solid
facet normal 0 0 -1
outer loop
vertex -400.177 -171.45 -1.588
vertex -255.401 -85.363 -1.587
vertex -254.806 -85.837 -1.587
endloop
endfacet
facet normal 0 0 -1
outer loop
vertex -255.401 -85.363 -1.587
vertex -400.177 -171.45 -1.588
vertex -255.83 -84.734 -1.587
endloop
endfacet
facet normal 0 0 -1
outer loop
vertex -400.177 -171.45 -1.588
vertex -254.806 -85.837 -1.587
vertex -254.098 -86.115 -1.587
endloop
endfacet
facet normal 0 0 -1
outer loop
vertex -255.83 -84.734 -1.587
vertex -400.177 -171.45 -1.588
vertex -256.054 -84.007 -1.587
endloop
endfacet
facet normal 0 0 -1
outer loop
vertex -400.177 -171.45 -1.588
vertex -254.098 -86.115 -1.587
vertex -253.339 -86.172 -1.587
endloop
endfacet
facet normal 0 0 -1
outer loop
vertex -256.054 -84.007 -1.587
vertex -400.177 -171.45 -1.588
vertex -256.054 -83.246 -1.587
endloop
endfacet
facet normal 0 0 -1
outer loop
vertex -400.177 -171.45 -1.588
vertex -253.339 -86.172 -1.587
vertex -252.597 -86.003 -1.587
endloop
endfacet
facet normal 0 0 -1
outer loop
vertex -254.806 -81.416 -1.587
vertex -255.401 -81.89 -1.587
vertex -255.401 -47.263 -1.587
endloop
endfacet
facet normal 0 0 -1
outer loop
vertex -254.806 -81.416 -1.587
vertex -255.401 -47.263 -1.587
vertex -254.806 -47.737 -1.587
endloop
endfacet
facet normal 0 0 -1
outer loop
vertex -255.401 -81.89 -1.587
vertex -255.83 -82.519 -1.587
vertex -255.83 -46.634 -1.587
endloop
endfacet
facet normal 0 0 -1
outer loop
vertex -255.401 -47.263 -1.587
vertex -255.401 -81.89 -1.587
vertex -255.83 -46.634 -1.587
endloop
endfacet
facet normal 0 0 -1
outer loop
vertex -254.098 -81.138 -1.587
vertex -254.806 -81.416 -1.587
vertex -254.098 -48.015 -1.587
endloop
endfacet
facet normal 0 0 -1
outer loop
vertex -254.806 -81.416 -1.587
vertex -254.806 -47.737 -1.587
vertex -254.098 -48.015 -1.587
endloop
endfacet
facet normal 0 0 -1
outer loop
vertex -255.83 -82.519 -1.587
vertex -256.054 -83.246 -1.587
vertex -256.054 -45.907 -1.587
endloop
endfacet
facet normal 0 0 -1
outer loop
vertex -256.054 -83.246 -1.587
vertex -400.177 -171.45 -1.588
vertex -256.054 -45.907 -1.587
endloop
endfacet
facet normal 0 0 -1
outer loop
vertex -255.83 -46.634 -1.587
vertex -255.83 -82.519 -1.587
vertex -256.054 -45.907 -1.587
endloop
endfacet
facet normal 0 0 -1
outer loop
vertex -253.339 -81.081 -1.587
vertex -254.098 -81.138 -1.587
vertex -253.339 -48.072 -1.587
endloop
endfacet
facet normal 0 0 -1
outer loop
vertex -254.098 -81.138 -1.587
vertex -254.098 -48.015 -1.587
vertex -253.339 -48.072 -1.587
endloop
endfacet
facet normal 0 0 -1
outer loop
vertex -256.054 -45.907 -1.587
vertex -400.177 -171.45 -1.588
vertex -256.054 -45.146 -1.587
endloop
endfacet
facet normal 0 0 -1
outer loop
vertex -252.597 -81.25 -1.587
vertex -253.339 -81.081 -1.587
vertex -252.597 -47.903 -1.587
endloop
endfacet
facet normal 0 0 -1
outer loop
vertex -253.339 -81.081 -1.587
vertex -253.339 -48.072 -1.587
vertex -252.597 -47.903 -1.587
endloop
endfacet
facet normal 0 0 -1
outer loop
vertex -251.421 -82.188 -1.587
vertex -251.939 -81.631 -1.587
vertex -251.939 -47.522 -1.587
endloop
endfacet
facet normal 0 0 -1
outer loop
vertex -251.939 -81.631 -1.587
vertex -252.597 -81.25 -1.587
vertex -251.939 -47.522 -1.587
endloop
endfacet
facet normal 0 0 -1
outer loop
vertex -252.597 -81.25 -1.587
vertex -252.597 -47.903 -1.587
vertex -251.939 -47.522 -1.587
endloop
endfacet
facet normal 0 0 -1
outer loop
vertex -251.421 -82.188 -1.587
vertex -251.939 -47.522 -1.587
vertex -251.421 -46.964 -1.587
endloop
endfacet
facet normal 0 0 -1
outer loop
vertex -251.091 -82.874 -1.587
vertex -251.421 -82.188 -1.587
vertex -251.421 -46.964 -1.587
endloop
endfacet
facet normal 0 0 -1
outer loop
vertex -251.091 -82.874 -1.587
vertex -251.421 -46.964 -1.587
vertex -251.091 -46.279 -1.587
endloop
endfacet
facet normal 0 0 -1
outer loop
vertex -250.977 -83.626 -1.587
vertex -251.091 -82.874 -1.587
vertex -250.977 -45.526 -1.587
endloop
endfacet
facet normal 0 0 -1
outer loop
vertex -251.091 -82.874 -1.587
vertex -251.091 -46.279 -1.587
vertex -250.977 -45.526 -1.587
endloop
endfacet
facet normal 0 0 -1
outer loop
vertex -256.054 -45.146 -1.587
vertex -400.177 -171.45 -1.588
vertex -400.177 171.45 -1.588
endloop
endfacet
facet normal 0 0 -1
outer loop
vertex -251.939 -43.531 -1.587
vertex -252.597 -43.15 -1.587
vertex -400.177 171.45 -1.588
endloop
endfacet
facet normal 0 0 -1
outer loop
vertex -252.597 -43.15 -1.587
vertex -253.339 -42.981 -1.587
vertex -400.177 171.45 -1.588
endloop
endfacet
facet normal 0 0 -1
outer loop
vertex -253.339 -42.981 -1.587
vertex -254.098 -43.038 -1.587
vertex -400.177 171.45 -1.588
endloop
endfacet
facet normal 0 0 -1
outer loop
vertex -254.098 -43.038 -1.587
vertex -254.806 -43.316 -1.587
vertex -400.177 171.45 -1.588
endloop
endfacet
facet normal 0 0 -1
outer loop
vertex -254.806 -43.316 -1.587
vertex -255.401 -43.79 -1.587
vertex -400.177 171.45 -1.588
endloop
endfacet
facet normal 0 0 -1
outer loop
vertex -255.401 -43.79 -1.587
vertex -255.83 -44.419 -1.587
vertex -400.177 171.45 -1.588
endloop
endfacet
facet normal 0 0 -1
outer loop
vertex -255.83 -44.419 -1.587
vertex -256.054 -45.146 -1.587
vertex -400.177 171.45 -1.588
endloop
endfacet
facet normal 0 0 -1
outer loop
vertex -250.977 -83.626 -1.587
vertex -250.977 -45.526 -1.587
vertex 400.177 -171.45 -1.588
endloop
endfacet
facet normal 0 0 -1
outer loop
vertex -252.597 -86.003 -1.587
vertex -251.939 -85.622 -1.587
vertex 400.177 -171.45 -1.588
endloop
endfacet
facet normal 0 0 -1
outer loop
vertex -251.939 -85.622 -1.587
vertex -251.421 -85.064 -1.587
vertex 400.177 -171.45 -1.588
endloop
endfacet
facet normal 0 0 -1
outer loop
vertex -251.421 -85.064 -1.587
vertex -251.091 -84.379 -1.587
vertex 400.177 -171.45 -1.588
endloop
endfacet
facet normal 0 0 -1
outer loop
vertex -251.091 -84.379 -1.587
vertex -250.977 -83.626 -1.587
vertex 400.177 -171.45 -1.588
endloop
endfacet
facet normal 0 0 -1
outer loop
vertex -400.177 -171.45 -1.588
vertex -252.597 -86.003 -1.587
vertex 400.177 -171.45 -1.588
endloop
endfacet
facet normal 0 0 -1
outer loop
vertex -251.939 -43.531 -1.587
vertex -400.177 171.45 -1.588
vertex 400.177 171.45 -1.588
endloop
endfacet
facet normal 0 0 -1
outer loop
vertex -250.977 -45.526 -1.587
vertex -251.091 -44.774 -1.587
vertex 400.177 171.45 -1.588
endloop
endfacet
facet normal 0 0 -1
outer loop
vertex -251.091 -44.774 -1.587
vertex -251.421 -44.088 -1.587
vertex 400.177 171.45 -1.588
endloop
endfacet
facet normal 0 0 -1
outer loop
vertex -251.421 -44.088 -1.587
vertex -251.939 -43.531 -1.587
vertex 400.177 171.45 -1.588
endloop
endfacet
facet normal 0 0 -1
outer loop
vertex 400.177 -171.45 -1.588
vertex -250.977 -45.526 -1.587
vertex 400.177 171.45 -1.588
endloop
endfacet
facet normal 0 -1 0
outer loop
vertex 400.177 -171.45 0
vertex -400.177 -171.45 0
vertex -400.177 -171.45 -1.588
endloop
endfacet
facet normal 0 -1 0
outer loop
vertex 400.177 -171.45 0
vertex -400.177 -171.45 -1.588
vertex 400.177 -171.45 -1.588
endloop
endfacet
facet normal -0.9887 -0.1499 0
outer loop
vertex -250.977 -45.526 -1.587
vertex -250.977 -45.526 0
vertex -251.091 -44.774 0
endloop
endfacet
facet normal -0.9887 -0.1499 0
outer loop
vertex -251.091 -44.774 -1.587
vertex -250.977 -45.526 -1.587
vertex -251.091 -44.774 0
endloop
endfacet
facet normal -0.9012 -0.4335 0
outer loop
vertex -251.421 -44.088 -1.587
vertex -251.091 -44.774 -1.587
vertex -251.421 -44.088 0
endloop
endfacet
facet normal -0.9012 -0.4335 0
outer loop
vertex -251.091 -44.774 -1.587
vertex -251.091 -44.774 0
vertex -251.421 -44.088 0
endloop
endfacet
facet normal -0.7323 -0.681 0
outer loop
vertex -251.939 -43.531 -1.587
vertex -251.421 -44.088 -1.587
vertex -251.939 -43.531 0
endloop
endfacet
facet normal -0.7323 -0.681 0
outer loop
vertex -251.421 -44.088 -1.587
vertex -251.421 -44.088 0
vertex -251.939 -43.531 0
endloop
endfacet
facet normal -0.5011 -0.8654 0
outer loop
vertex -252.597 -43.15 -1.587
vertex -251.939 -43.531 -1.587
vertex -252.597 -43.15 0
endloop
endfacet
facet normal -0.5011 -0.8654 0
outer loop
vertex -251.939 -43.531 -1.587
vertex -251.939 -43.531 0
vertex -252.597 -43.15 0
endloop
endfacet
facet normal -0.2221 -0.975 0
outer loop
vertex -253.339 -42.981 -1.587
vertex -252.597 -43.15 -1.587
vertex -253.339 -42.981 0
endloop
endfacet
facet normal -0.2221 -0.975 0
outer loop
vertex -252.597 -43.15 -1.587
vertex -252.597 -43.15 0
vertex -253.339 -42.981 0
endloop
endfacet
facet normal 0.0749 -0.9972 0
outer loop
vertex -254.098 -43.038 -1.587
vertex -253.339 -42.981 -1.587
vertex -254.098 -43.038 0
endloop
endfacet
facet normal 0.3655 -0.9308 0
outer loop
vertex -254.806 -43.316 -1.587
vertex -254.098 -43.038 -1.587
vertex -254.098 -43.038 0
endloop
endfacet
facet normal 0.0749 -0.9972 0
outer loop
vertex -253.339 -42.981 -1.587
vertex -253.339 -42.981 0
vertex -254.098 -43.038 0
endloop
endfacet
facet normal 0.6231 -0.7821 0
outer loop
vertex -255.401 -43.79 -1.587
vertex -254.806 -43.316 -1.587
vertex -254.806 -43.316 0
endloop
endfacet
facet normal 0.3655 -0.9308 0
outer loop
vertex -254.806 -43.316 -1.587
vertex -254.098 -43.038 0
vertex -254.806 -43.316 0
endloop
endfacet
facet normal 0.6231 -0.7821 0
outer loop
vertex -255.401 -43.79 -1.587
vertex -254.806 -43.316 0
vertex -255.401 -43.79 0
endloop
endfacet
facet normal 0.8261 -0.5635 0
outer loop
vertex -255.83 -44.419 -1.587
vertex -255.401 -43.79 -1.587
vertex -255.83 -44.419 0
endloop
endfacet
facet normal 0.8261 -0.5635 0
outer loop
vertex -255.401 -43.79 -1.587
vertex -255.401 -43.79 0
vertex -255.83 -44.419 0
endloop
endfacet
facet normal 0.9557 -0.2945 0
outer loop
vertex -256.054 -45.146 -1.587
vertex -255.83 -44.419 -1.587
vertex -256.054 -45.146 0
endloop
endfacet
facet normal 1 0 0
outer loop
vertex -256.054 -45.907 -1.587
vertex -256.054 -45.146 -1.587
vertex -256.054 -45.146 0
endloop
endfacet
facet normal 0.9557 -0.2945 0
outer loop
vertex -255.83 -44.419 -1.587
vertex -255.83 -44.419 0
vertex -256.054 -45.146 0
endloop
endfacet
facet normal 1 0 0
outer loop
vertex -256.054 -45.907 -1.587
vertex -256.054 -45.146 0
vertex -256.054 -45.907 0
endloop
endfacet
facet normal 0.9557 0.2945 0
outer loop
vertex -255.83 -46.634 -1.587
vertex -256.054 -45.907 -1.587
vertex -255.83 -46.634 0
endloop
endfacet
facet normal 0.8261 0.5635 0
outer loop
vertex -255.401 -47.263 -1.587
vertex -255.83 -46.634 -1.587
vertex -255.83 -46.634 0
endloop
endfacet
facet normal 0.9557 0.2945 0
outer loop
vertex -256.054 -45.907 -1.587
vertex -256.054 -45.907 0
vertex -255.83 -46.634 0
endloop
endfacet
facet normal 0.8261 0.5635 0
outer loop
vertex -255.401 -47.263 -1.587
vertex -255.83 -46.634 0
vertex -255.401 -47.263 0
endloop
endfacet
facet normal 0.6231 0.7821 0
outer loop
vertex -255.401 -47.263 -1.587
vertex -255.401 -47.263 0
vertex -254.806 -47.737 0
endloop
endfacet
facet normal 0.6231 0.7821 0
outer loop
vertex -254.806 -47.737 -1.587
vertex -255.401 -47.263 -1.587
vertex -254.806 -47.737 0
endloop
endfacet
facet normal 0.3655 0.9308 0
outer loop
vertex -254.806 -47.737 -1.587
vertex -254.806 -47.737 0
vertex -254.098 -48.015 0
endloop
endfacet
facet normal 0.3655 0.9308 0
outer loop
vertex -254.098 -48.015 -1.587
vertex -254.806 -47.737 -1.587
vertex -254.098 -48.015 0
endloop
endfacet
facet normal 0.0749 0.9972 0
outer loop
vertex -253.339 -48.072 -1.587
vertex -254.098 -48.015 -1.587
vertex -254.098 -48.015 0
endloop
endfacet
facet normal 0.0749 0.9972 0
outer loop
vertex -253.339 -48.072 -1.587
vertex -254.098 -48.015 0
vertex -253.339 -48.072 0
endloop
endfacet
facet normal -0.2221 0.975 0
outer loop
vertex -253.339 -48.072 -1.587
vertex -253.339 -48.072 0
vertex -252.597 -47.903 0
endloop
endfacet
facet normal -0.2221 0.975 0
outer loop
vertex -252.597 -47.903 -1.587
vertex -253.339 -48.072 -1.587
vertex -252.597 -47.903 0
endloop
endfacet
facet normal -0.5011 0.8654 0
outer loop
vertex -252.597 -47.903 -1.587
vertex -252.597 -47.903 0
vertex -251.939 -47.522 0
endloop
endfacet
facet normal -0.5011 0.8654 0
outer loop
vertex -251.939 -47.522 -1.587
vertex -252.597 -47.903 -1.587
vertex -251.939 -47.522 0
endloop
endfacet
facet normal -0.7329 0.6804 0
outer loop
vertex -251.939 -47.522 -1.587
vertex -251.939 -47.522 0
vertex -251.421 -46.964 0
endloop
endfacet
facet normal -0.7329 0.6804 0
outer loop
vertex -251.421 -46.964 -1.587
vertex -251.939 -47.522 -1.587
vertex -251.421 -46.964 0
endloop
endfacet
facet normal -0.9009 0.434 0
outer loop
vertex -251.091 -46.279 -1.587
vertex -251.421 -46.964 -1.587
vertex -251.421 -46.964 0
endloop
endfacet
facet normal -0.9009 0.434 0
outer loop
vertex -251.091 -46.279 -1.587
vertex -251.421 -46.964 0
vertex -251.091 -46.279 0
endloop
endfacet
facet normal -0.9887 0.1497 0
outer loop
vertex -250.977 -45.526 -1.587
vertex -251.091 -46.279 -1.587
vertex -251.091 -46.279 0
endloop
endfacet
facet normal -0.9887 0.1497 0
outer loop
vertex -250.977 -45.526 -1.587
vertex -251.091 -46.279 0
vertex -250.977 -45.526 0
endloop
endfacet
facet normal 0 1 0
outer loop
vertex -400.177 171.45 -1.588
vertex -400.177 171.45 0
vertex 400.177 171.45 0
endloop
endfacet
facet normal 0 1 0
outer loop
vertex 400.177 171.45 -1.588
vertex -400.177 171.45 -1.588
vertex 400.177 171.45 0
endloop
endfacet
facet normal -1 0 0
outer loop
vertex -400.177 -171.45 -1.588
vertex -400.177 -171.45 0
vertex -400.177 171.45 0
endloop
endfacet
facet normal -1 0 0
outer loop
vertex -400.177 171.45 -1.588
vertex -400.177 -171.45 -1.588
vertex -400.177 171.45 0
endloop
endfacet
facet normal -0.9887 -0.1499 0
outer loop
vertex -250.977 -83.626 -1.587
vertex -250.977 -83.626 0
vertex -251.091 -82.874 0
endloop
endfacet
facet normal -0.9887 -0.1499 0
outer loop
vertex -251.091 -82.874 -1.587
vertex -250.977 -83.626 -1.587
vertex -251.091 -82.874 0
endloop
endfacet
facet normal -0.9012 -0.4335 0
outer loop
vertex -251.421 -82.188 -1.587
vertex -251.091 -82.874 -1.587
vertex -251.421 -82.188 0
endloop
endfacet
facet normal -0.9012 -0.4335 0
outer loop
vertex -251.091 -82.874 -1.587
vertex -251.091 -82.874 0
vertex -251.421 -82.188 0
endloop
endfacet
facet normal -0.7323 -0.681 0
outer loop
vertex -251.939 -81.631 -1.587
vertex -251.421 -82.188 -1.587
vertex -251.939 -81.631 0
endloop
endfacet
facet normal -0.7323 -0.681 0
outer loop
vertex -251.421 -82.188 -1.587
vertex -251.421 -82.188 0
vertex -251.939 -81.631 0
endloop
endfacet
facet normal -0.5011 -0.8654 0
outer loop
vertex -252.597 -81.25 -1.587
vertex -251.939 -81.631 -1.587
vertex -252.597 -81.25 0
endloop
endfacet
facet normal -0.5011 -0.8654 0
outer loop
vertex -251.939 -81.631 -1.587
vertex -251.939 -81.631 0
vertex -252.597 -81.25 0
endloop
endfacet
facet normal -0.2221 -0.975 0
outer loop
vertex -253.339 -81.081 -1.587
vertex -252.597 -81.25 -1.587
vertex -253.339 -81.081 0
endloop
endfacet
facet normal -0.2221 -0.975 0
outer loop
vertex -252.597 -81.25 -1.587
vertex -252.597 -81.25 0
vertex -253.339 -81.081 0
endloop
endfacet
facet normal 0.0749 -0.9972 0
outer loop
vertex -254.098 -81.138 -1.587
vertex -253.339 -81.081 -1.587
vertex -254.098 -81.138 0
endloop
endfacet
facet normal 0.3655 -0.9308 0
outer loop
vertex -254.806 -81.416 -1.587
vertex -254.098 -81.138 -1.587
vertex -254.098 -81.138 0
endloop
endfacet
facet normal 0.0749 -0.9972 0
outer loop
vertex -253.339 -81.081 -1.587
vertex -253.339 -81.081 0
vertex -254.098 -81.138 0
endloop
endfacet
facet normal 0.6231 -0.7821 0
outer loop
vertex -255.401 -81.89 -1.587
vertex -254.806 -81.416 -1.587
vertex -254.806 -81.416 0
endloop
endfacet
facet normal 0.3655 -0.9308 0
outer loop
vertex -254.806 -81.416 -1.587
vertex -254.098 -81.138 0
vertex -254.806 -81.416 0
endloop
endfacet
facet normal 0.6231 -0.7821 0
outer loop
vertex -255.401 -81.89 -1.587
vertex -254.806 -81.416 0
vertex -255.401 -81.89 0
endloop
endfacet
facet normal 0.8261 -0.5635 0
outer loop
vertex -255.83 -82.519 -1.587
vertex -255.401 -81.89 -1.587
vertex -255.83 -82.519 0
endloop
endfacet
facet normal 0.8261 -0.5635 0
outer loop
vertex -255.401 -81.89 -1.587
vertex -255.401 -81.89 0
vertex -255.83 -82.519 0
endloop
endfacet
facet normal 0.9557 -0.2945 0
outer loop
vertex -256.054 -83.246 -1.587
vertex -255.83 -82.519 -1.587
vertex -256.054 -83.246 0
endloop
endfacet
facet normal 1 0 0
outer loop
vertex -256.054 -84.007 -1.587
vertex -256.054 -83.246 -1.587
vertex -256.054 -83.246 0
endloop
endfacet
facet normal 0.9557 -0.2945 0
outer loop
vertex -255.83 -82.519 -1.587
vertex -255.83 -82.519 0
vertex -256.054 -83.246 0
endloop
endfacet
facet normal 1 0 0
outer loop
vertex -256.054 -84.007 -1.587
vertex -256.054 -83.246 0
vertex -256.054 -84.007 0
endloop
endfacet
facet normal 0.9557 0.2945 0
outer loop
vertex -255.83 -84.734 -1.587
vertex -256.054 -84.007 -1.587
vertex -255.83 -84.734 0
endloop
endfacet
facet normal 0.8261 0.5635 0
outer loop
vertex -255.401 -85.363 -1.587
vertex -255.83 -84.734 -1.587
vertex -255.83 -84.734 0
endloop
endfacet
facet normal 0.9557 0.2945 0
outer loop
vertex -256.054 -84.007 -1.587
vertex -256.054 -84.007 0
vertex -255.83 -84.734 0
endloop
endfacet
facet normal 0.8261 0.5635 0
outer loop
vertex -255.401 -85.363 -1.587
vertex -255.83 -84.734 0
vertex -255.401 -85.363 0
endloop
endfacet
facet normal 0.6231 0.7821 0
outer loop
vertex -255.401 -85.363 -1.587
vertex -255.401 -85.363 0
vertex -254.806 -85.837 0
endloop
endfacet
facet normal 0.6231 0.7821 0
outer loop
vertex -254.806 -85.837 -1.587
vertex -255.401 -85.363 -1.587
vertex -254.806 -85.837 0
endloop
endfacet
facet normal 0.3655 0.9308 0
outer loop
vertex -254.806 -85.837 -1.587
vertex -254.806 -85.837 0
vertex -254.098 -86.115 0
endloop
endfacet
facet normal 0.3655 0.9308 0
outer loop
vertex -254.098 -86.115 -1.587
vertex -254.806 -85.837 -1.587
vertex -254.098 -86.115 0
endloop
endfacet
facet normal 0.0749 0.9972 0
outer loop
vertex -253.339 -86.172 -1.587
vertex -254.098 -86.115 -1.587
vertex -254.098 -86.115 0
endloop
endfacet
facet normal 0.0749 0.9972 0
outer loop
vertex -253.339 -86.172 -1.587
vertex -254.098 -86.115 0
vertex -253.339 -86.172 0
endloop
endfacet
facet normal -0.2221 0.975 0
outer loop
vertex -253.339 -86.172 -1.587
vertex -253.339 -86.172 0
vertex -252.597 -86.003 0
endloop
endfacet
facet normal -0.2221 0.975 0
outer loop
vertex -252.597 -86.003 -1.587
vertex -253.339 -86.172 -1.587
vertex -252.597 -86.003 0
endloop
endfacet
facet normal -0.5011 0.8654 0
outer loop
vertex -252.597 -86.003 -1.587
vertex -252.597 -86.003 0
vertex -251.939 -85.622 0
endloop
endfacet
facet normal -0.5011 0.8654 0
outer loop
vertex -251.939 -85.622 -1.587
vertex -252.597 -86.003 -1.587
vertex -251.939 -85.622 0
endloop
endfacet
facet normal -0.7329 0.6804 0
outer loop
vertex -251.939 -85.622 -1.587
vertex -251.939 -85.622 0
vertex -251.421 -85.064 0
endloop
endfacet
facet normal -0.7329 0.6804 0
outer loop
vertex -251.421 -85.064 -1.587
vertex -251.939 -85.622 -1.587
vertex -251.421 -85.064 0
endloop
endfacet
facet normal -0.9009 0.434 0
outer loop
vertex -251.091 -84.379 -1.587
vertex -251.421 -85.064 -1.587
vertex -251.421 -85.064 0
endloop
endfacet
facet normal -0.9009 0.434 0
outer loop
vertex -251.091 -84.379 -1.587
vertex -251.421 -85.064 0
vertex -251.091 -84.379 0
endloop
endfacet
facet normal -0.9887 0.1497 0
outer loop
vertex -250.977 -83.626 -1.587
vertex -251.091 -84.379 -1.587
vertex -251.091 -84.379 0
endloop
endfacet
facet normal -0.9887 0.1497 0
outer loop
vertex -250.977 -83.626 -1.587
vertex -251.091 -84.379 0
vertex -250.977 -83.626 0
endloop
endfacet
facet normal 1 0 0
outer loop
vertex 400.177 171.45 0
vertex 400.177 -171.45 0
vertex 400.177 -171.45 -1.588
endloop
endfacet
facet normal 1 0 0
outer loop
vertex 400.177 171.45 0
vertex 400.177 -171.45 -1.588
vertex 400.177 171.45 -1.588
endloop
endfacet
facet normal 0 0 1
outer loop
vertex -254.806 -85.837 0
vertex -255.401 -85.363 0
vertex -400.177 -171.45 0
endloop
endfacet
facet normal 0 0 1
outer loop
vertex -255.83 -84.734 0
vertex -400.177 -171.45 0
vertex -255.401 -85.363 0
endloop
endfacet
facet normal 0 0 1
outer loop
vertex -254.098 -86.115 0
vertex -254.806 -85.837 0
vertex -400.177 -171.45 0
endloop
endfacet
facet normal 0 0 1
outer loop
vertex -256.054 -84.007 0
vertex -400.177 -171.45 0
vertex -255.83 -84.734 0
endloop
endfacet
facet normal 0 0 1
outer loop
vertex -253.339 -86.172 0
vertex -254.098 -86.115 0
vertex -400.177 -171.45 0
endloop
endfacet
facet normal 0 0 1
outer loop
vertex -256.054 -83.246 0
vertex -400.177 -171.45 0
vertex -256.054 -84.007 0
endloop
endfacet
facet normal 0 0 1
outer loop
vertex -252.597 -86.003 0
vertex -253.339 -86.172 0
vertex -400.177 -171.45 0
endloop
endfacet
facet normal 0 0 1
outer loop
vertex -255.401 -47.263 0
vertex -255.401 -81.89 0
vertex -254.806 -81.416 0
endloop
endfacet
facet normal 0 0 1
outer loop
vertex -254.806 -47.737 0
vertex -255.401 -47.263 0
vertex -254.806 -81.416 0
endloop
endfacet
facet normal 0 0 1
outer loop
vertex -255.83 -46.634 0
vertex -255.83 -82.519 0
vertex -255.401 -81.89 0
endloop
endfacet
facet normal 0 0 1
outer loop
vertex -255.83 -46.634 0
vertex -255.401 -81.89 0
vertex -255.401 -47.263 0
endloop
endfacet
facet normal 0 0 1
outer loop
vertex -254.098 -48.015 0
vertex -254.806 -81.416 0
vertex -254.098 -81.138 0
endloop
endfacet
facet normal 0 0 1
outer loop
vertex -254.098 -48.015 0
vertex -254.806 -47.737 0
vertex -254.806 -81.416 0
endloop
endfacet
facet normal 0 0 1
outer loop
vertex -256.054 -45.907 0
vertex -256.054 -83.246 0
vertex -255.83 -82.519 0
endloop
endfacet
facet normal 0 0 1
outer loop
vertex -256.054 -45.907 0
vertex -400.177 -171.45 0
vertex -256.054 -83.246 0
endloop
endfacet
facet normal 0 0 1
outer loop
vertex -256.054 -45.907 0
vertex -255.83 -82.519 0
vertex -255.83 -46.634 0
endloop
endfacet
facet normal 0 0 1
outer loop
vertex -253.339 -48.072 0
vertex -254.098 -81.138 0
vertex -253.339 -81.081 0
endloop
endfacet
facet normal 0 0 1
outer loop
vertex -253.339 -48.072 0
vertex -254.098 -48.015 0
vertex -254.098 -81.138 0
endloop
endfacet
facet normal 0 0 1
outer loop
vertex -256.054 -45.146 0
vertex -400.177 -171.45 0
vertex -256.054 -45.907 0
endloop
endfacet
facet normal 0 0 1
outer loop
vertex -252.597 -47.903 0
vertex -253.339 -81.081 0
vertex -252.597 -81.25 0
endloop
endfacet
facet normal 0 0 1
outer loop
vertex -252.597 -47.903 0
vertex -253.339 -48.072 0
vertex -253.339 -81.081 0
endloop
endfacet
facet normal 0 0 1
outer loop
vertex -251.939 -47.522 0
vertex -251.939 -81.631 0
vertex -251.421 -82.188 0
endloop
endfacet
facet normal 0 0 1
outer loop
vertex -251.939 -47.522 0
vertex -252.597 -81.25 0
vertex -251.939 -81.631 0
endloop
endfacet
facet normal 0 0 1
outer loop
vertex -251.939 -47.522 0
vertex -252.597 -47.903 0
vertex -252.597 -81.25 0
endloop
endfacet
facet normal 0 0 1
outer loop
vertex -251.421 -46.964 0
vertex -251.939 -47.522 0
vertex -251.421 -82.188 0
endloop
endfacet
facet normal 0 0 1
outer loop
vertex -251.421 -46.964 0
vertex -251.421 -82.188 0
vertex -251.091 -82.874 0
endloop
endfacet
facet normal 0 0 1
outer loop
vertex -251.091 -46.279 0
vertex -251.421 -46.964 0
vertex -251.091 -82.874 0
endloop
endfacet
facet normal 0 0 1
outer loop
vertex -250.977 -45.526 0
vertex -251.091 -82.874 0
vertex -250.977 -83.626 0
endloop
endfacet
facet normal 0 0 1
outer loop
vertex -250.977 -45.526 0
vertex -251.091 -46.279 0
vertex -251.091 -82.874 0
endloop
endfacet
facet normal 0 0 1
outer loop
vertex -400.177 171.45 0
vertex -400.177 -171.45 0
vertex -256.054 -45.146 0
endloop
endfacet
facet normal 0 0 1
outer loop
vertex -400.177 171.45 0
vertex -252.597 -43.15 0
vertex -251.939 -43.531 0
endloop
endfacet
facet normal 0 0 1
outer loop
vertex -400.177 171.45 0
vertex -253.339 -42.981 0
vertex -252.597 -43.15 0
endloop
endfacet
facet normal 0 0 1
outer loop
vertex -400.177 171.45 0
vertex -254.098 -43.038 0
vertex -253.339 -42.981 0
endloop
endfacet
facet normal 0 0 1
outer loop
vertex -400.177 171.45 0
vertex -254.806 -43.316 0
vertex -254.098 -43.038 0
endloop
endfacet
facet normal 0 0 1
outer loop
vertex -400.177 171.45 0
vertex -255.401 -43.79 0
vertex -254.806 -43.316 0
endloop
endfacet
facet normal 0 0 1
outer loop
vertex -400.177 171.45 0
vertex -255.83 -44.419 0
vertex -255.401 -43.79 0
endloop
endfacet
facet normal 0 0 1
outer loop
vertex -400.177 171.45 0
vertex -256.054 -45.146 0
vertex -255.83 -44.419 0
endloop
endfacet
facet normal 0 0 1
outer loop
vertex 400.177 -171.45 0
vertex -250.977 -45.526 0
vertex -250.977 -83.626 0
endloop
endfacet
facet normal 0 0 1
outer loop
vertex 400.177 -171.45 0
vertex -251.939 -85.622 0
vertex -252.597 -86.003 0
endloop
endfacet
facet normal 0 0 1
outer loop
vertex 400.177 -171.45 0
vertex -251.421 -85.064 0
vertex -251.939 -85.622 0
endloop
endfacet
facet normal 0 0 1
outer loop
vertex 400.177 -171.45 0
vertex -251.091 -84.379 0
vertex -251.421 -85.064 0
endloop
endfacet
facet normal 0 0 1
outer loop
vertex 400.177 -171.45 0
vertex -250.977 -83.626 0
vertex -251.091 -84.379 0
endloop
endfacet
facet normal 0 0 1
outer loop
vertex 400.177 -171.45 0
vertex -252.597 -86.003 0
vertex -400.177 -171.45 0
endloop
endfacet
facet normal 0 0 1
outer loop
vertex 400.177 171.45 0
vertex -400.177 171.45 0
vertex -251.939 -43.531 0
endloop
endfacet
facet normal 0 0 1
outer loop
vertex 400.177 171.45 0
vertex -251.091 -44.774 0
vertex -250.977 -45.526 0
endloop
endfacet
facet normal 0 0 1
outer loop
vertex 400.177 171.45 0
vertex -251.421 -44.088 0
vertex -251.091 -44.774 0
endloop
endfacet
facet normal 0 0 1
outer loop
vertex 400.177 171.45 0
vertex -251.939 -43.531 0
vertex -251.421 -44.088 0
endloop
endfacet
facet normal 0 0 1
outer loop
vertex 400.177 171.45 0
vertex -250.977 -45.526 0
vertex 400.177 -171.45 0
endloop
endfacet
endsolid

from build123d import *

# Parameters (mm, degrees)
SKETCH1_W              = 800.354
SKETCH1_H              = 342.9
BASE_FLANGE1_DEPTH     = 1.5875
F_10_CLEARANCE_HOLE2_D = 5.1054


# Sheet-metal steps are written as plain solids
with BuildPart() as part:
    # Sketch1 → Base-Flange1 (new body)
    with BuildSketch(Plane.XY):
        Rectangle(SKETCH1_W, SKETCH1_H)
    extrude(amount=-BASE_FLANGE1_DEPTH)

    # #10 Clearance Hole2 (through all)
    with Locations(Plane(origin=(0, 0, -1.5875), x_dir=(-1, 0, 0), z_dir=(0, 0, -1))):
        with Locations((253.5301, -83.626485628), (253.5301, -45.526485628)):
            Hole(F_10_CLEARANCE_HOLE2_D / 2)


solid = part.part
